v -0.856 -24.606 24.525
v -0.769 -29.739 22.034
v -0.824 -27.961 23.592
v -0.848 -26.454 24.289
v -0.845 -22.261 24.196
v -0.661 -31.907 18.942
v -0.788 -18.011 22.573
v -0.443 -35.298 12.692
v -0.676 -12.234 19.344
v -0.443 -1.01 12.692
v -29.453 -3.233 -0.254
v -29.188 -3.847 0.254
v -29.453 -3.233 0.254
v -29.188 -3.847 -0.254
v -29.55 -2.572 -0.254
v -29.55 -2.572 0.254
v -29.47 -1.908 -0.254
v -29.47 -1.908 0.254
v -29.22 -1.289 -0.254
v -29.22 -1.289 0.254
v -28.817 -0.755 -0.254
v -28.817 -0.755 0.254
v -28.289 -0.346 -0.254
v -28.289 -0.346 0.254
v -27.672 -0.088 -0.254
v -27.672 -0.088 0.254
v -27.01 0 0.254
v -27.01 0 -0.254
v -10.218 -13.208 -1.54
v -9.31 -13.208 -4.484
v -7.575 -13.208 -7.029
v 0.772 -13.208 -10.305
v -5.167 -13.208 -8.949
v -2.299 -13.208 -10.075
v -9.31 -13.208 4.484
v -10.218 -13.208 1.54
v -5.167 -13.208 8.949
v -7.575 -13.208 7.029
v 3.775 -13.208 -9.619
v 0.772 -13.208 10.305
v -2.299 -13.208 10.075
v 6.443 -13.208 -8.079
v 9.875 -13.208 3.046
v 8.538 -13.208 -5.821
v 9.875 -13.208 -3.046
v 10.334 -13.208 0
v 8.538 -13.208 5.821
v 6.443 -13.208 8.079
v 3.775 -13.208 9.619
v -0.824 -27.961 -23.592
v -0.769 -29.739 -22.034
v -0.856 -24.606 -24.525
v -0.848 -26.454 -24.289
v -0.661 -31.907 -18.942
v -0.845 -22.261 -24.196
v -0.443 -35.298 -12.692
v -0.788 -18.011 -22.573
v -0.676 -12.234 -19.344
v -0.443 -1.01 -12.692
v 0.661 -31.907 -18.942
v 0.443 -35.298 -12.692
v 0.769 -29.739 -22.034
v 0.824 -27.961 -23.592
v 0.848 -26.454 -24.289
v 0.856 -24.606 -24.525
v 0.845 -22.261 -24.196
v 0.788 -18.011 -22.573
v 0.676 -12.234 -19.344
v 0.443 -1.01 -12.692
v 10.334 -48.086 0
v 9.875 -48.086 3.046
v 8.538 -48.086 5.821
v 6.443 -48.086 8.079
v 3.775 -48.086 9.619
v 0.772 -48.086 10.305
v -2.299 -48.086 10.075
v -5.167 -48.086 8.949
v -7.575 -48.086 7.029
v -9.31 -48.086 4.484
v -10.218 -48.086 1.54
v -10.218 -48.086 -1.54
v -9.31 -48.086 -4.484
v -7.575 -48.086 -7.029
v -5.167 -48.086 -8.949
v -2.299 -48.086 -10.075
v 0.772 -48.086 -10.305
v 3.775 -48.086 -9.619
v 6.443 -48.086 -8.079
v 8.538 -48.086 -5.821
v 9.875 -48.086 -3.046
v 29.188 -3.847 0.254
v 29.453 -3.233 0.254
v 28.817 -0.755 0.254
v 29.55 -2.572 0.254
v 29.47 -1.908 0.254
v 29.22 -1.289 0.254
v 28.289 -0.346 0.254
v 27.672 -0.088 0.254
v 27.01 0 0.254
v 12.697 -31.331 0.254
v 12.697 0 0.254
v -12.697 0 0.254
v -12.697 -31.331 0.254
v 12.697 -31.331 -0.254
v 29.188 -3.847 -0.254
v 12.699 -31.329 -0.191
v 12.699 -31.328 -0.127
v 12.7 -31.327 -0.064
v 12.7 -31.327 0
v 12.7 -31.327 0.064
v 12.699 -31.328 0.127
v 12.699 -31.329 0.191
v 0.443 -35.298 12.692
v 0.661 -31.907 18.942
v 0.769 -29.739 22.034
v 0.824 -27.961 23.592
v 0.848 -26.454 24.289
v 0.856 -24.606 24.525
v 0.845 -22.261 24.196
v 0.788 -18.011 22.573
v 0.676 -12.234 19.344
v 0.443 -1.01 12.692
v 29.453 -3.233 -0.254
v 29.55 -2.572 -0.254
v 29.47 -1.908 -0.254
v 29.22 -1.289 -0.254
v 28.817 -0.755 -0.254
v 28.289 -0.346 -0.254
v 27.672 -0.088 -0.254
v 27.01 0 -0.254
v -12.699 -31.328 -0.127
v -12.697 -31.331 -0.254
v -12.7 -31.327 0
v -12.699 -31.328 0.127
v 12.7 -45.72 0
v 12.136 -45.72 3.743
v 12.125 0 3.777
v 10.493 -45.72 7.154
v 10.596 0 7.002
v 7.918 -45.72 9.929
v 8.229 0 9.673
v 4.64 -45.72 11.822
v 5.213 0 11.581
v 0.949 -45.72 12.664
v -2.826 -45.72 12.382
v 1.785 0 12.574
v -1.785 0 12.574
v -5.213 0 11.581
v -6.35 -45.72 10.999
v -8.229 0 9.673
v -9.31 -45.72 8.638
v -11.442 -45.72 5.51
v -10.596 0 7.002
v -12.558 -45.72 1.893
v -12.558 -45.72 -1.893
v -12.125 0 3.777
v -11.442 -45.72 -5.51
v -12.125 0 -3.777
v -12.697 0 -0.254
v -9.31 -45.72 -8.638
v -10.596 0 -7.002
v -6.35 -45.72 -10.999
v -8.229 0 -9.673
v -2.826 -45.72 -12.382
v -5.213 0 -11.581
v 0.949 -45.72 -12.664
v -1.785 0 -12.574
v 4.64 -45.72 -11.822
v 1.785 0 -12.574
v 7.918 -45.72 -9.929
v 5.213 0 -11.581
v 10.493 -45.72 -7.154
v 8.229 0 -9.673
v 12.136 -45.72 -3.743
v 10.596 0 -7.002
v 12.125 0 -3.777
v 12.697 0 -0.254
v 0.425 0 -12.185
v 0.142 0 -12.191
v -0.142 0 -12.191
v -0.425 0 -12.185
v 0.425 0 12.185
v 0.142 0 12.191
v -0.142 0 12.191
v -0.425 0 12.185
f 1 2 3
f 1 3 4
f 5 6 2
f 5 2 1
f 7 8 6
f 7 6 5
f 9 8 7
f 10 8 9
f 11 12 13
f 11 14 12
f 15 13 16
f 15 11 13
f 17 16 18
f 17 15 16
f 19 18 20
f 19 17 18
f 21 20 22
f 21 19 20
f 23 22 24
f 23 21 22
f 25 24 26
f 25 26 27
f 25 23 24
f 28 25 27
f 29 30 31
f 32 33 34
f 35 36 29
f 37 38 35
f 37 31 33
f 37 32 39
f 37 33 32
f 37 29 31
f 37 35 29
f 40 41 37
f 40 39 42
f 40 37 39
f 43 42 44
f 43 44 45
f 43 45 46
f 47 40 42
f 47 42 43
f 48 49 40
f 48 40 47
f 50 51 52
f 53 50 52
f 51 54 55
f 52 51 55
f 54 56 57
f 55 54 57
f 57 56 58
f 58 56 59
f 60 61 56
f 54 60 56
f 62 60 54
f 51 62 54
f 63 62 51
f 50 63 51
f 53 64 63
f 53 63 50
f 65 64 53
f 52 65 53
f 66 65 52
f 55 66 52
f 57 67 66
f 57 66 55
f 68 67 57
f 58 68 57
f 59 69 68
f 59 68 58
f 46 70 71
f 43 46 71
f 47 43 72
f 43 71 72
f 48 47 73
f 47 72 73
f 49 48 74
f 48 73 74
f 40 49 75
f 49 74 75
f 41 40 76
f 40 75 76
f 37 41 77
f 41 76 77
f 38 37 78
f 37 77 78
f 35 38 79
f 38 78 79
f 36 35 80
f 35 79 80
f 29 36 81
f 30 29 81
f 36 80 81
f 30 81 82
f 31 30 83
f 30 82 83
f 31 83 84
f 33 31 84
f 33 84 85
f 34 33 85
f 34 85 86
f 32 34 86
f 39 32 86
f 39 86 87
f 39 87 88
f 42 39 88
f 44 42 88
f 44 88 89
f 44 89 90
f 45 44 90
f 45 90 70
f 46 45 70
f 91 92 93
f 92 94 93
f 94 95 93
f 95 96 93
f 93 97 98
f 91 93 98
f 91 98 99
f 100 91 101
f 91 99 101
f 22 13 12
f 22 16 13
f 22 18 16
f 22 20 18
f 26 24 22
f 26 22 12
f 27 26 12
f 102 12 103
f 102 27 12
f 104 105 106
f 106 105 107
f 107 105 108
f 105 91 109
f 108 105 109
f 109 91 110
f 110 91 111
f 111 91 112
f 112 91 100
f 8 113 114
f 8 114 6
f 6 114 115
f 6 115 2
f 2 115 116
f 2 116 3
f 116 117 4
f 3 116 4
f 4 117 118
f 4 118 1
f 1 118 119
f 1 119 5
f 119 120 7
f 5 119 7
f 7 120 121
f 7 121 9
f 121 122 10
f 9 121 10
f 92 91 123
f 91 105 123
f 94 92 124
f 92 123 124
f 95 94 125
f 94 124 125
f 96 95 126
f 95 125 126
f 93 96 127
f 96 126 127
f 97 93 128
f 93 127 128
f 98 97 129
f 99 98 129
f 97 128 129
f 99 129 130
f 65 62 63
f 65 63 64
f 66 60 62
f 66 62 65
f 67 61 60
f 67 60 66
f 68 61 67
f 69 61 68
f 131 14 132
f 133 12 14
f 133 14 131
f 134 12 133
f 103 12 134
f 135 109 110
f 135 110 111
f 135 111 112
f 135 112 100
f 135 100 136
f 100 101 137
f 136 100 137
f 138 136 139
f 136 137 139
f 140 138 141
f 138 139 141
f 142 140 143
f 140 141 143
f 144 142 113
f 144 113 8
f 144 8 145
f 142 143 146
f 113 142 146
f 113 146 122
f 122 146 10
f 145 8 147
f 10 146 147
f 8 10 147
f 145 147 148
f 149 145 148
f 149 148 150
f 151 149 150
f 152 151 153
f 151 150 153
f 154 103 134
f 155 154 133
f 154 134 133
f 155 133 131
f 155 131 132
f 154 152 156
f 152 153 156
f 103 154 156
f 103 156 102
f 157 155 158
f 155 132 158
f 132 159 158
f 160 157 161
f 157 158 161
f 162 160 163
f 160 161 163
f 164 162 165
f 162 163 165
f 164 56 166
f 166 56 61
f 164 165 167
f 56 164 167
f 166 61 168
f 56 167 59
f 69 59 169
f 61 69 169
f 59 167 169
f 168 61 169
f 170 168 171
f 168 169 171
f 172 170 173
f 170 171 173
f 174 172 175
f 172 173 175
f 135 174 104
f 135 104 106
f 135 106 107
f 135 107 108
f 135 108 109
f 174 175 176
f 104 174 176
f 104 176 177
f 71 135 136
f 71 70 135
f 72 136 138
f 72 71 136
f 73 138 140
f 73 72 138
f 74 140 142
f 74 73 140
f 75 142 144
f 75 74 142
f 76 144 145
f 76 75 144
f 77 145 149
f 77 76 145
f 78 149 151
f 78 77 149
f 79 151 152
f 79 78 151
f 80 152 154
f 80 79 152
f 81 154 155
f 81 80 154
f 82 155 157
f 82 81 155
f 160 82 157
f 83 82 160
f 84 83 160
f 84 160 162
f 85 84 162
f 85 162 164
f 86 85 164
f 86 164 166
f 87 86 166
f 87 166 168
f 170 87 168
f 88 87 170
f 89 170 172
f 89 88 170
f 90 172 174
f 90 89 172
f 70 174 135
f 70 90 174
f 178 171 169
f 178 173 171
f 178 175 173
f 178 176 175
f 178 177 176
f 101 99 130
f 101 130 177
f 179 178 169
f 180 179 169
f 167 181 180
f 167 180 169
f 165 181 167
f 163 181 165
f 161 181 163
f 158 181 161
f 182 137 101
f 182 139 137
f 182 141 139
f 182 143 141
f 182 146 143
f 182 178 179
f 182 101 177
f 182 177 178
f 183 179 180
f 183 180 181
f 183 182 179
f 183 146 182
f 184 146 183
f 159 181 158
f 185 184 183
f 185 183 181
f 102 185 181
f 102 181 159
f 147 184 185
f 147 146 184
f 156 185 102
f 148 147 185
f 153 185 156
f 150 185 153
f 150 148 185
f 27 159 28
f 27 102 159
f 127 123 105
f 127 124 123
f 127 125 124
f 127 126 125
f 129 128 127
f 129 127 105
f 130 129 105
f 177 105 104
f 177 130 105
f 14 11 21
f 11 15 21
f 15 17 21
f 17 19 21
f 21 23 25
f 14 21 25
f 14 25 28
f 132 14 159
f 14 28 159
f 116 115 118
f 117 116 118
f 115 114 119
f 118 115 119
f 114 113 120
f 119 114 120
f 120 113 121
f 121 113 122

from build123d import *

# Parameters (mm, degrees)
F0_R          = 12.7
F1_DEPTH      = 50.8
F2_R          = 10.3336081204
F3_DEPTH      = 37.592
F6_DEPTH      = 0.254
F7_R          = 2.54
F9_ANGLE_BACK = 2
F9_ANGLE      = 4


# Not quite as in the source:
# - a fillet or chamfer that OpenCascade refuses, or shapes differently, is made with other operations: its cross-section is extruded or revolved along the edge and cut away or added


with BuildPart() as f1:
    # F0 (on Front) → F1 (new body)
    with BuildSketch(Plane.XZ):
        Circle(F0_R)
    extrude(amount=F1_DEPTH)

    # F2 (on face) → F3 (cut)
    with BuildSketch(Plane.XZ.offset(50.8)):
        Circle(F2_R)
    extrude(amount=-F3_DEPTH, mode=Mode.SUBTRACT)

    # F8: F6 across plane


with BuildPart() as f6:
    # F5 (on Top) → F6 (new body, symmetric)
    with BuildSketch(Plane.XY):
        Polygon((-12.446, -31.75), (-12.446, 0), (-31.496, 0), align=None)
    extrude(amount=F6_DEPTH, both=True)

    # F7
    f7_edges = [f6.edges().sort_by_distance(p)[0] for p in [
        (-31.496, 0, 0),
    ]]
    fillet(f7_edges, radius=F7_R)


with BuildPart() as f1_1:
    add(f1.part)
    add(f6.part.mirror(Plane.YZ))

    # F4 (on Right) → F9 (revolve)
    with BuildSketch(Plane.YZ, mode=Mode.PRIVATE) as f9_sk:
        with BuildLine():
            Line((0, -12.192), (-35.6481084037, -12.192))
            add(Edge.make_bspline(
                [(-35.6481084037, -12.192), (-33.4311420603, -15.1893612741), (-28.0519206857, -33.0906197841), (-9.917521665, -17.0447887187), (0, -12.192)],
                knots=[0, 0, 0, 0, 0.4167760817, 1, 1, 1, 1], degree=3))
        make_face()
    revolve(f9_sk.sketch.rotate(Axis((0, 0, 0), (0, 1, 0)), -F9_ANGLE_BACK), axis=Axis((0, 0, 0), (0, 1, 0)), revolution_arc=F9_ANGLE)

    # F10: chamfer of 5.08 on 1 edges, made by hand

    # F10_s1 → F10_t2 (revolve, cut)
    with BuildSketch(Plane.XY):
        Polygon((12.7, -45.72), (7.62, -50.8), (12.7, -50.8), align=None)
    revolve(axis=Axis((0, -50.8, 0), (0, -1, 0)), mode=Mode.SUBTRACT)



with BuildPart() as f1_2:
    add(f1_1.part)

    add(f6.part)  # F11 merges F6
    # F11: F1 across plane
    add(f1_1.part.mirror(Plane.XY))


solid = f1_2.part
